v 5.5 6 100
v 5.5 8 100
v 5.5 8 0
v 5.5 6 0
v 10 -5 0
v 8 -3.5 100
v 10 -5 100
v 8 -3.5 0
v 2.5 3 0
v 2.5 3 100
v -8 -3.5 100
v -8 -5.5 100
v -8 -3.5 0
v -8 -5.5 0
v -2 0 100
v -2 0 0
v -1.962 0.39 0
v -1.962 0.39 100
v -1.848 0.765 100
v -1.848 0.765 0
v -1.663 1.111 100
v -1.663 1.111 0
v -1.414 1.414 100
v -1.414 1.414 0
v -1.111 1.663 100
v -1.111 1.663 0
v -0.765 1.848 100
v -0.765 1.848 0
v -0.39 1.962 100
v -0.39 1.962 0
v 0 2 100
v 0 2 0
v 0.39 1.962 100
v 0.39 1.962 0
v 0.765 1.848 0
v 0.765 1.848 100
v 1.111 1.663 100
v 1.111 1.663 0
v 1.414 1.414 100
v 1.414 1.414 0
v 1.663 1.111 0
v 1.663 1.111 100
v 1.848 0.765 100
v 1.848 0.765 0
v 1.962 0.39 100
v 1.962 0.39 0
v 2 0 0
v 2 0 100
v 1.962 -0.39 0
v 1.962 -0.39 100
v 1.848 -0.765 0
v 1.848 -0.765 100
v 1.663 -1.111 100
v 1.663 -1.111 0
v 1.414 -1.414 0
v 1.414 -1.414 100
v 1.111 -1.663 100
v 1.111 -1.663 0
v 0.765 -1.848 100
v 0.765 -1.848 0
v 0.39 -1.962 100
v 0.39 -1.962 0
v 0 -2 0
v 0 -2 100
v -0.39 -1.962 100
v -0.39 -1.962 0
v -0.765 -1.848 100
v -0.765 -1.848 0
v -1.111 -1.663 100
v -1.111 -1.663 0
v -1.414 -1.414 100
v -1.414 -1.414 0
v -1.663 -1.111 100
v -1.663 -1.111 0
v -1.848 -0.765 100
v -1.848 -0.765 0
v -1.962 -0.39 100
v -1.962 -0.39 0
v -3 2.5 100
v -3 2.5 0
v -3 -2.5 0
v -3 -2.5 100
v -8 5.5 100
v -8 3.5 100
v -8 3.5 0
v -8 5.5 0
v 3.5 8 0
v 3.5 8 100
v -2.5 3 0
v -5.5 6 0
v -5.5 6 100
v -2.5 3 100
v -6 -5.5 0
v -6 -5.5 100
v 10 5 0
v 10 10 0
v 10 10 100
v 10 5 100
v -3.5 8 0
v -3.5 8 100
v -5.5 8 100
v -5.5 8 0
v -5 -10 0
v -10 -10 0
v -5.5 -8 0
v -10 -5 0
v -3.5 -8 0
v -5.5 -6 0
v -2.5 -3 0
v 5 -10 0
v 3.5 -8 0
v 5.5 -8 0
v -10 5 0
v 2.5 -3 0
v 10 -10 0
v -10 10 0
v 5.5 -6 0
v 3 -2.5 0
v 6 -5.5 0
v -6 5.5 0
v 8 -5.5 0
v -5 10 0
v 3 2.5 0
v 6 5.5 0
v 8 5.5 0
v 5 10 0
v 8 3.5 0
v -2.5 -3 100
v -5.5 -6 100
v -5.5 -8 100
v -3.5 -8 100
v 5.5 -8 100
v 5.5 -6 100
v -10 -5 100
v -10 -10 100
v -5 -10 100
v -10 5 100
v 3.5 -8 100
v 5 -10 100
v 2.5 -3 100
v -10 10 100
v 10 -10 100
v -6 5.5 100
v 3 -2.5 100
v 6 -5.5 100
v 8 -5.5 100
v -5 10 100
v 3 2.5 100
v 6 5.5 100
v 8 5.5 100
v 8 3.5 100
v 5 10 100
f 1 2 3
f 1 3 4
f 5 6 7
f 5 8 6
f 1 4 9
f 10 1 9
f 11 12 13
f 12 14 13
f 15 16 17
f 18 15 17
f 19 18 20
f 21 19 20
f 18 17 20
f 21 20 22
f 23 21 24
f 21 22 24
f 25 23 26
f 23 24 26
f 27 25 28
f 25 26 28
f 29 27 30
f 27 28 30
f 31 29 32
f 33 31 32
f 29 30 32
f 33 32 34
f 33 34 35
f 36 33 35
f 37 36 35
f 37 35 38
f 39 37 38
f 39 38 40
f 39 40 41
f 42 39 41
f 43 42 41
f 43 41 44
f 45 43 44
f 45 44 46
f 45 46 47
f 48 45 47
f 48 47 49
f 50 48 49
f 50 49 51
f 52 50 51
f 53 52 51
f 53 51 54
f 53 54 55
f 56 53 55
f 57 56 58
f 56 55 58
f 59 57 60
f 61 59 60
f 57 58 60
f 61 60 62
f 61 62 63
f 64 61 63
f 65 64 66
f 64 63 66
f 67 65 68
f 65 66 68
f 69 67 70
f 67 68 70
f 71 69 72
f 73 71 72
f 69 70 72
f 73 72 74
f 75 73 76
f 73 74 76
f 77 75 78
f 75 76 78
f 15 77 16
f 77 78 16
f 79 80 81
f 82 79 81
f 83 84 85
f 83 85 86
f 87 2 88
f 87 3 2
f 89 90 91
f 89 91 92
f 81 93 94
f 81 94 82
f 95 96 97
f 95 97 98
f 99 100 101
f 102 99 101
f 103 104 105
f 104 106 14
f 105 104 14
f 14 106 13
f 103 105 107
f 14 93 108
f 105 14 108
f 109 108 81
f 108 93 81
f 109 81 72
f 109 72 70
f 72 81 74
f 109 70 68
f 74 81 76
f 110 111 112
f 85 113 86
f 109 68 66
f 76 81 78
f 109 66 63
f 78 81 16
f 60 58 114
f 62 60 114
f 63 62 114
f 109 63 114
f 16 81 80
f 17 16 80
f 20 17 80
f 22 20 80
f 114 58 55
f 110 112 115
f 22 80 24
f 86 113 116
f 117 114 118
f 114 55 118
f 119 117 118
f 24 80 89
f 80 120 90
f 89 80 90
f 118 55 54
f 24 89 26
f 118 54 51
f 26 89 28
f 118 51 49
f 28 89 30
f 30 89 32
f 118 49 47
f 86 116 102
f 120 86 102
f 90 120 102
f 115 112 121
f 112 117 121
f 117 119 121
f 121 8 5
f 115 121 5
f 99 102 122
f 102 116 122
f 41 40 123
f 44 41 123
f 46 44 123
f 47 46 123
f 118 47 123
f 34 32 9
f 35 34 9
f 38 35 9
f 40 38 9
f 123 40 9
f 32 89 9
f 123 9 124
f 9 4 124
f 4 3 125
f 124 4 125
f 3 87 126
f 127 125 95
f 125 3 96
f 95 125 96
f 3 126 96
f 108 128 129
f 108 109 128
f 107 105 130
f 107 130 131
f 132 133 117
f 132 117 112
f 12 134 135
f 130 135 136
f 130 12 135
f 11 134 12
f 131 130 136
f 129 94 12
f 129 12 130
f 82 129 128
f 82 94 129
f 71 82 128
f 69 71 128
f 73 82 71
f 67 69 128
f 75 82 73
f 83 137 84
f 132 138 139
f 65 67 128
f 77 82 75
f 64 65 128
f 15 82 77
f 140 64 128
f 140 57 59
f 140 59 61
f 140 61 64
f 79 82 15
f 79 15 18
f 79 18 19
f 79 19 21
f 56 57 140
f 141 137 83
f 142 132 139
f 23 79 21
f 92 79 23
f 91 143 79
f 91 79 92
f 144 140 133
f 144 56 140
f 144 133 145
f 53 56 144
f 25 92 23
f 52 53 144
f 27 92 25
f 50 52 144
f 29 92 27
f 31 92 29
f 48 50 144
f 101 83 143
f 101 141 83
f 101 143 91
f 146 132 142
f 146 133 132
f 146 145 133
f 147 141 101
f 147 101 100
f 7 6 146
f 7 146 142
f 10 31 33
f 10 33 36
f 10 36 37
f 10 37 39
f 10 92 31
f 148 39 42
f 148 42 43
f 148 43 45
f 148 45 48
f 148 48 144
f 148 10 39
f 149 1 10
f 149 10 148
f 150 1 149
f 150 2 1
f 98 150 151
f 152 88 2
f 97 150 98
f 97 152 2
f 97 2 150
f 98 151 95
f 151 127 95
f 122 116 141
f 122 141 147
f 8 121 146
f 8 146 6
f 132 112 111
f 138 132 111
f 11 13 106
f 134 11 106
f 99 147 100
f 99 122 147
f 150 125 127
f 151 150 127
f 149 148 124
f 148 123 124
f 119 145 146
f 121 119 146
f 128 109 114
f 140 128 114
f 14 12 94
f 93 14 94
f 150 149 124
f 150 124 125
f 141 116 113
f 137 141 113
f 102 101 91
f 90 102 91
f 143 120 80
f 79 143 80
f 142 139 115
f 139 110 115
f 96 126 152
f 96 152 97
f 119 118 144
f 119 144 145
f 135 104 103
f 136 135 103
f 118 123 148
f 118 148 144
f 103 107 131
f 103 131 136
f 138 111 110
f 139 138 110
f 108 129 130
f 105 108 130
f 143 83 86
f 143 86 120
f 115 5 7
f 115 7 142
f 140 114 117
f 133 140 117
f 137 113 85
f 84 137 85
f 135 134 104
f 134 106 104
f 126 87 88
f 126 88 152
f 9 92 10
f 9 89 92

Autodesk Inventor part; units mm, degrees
ref_plane "YZ Plane" through (0, 0, 0) normal (1, 0, 0) x (0, 1, 0)
ref_plane "XZ Plane" through (0, 0, 0) normal (0, 1, 0) x (-1, 0, 0)
ref_plane "XY Plane" through (0, 0, 0) normal (0, 0, 1) x (1, 0, 0)
sketch "Sketch1" plane through (0, 0, 0) normal (0, 0, 1) x (1, 0, 0)
  line L0 (-5, 10) -> (-3.5, 8)
  line L1 (-3.5, 8) -> (-5.5, 8)
  line L2 (5.5, 8) -> (3.5, 8)
  line L3 (3.5, 8) -> (5, 10)
  line L4 (-5.5, 8) -> (-5.5, 6)
  line L5 (5.5, 8) -> (5.5, 6)
  line L6 (-5.5, 6) -> (-2.5, 3)
  line L7 (5.5, 6) -> (2.5, 3)
  line L8 (-2.5, 3) -> (2.5, 3)
  line L9 (-10, 10) -> (-5, 10)
  line L10 (5, 10) -> (10, 10)
  line L11 (3, 2.5) -> (3, -2.5)
  line L12 (3, -2.5) -> (6, -5.5)
  line L13 (6, -5.5) -> (8, -5.5)
  line L14 (8, -5.5) -> (8, -3.5)
  line L15 (8, -3.5) -> (10, -5)
  line L16 (3, 2.5) -> (6, 5.5)
  line L17 (6, 5.5) -> (8, 5.5)
  line L18 (8, 5.5) -> (8, 3.5)
  line L19 (8, 3.5) -> (10, 5)
  line L20 (10, 10) -> (10, 5)
  line L21 (10, -5) -> (10, -10)
  line L22 (-10, 5) -> (-8, 3.5)
  line L23 (-8, 3.5) -> (-8, 5.5)
  line L24 (-8, -5.5) -> (-8, -3.5)
  line L25 (-8, -3.5) -> (-10, -5)
  line L26 (-8, 5.5) -> (-6, 5.5)
  line L27 (-8, -5.5) -> (-6, -5.5)
  line L28 (-6, 5.5) -> (-3, 2.5)
  line L29 (-6, -5.5) -> (-3, -2.5)
  line L30 (-3, 2.5) -> (-3, -2.5)
  line L31 (-10, 10) -> (-10, 5)
  line L32 (-10, -5) -> (-10, -10)
  line L33 (-2.5, -3) -> (2.5, -3)
  line L34 (2.5, -3) -> (5.5, -6)
  line L35 (5.5, -6) -> (5.5, -8)
  line L36 (5.5, -8) -> (3.5, -8)
  line L37 (3.5, -8) -> (5, -10)
  line L38 (-2.5, -3) -> (-5.5, -6)
  line L39 (-5.5, -6) -> (-5.5, -8)
  line L40 (-5.5, -8) -> (-3.5, -8)
  line L41 (-3.5, -8) -> (-5, -10)
  line L42 (-10, -10) -> (-5, -10)
  line L43 (5, -10) -> (10, -10)
  point P0 (0, 0)
  point P1 (0, 0)
  point P2 (0, 0)
  dimension "d0" = 20
  dimension "d1" = 20
  dimension "d3" = 2
  dimension "d4" = 2
  dimension "d6" = 1.5
  dimension "d7" = 2
  dimension "d8" = 2
  dimension "d9" = 3
  dimension "d11" = 3
  dimension "d12" = 3
  dimension "d13" = 5
  dimension "d22" = 5
  dimension "d24" = 3
  dimension "d25" = 3
  dimension "d26" = 2
  dimension "d27" = 5
  dimension "d28" = 2
  dimension "d29" = 2
  dimension "d30" = 1.5
  dimension "d31" = 3
  dimension "d32" = 5
  dimension "d33" = 5
  dimension "d35" = 5
  dimension "d36" = 5
  dimension "d37" = 5
  dimension "d38" = 5
  dimension "d40" = 3
  dimension "d41" = 3
  dimension "d42" = 2
  dimension "d43" = 2
  dimension "d48" = 3
  dimension "d49" = 3
  dimension "d50" = 3
  dimension "d51" = 3
  dimension "d52" = 0.5
  dimension "d53" = 0.5
  dimension "d54" = 0.5
  dimension "d55" = 0.5
  dimension "d56" = 0.5
extrude "Extrusion3" add sketch "Sketch1" along normal blind 100
sketch "Sketch3" plane through (0, 0, 0) normal (0, 0, -1) x (-1, 0, 0)
  circle A0 centre (0, 0) radius 2
  dimension "d59" = 4
extrude "Extrusion4" cut sketch "Sketch3" against normal through all
properties part number "20x20x100 Aluminium VSlot Extrustion"
